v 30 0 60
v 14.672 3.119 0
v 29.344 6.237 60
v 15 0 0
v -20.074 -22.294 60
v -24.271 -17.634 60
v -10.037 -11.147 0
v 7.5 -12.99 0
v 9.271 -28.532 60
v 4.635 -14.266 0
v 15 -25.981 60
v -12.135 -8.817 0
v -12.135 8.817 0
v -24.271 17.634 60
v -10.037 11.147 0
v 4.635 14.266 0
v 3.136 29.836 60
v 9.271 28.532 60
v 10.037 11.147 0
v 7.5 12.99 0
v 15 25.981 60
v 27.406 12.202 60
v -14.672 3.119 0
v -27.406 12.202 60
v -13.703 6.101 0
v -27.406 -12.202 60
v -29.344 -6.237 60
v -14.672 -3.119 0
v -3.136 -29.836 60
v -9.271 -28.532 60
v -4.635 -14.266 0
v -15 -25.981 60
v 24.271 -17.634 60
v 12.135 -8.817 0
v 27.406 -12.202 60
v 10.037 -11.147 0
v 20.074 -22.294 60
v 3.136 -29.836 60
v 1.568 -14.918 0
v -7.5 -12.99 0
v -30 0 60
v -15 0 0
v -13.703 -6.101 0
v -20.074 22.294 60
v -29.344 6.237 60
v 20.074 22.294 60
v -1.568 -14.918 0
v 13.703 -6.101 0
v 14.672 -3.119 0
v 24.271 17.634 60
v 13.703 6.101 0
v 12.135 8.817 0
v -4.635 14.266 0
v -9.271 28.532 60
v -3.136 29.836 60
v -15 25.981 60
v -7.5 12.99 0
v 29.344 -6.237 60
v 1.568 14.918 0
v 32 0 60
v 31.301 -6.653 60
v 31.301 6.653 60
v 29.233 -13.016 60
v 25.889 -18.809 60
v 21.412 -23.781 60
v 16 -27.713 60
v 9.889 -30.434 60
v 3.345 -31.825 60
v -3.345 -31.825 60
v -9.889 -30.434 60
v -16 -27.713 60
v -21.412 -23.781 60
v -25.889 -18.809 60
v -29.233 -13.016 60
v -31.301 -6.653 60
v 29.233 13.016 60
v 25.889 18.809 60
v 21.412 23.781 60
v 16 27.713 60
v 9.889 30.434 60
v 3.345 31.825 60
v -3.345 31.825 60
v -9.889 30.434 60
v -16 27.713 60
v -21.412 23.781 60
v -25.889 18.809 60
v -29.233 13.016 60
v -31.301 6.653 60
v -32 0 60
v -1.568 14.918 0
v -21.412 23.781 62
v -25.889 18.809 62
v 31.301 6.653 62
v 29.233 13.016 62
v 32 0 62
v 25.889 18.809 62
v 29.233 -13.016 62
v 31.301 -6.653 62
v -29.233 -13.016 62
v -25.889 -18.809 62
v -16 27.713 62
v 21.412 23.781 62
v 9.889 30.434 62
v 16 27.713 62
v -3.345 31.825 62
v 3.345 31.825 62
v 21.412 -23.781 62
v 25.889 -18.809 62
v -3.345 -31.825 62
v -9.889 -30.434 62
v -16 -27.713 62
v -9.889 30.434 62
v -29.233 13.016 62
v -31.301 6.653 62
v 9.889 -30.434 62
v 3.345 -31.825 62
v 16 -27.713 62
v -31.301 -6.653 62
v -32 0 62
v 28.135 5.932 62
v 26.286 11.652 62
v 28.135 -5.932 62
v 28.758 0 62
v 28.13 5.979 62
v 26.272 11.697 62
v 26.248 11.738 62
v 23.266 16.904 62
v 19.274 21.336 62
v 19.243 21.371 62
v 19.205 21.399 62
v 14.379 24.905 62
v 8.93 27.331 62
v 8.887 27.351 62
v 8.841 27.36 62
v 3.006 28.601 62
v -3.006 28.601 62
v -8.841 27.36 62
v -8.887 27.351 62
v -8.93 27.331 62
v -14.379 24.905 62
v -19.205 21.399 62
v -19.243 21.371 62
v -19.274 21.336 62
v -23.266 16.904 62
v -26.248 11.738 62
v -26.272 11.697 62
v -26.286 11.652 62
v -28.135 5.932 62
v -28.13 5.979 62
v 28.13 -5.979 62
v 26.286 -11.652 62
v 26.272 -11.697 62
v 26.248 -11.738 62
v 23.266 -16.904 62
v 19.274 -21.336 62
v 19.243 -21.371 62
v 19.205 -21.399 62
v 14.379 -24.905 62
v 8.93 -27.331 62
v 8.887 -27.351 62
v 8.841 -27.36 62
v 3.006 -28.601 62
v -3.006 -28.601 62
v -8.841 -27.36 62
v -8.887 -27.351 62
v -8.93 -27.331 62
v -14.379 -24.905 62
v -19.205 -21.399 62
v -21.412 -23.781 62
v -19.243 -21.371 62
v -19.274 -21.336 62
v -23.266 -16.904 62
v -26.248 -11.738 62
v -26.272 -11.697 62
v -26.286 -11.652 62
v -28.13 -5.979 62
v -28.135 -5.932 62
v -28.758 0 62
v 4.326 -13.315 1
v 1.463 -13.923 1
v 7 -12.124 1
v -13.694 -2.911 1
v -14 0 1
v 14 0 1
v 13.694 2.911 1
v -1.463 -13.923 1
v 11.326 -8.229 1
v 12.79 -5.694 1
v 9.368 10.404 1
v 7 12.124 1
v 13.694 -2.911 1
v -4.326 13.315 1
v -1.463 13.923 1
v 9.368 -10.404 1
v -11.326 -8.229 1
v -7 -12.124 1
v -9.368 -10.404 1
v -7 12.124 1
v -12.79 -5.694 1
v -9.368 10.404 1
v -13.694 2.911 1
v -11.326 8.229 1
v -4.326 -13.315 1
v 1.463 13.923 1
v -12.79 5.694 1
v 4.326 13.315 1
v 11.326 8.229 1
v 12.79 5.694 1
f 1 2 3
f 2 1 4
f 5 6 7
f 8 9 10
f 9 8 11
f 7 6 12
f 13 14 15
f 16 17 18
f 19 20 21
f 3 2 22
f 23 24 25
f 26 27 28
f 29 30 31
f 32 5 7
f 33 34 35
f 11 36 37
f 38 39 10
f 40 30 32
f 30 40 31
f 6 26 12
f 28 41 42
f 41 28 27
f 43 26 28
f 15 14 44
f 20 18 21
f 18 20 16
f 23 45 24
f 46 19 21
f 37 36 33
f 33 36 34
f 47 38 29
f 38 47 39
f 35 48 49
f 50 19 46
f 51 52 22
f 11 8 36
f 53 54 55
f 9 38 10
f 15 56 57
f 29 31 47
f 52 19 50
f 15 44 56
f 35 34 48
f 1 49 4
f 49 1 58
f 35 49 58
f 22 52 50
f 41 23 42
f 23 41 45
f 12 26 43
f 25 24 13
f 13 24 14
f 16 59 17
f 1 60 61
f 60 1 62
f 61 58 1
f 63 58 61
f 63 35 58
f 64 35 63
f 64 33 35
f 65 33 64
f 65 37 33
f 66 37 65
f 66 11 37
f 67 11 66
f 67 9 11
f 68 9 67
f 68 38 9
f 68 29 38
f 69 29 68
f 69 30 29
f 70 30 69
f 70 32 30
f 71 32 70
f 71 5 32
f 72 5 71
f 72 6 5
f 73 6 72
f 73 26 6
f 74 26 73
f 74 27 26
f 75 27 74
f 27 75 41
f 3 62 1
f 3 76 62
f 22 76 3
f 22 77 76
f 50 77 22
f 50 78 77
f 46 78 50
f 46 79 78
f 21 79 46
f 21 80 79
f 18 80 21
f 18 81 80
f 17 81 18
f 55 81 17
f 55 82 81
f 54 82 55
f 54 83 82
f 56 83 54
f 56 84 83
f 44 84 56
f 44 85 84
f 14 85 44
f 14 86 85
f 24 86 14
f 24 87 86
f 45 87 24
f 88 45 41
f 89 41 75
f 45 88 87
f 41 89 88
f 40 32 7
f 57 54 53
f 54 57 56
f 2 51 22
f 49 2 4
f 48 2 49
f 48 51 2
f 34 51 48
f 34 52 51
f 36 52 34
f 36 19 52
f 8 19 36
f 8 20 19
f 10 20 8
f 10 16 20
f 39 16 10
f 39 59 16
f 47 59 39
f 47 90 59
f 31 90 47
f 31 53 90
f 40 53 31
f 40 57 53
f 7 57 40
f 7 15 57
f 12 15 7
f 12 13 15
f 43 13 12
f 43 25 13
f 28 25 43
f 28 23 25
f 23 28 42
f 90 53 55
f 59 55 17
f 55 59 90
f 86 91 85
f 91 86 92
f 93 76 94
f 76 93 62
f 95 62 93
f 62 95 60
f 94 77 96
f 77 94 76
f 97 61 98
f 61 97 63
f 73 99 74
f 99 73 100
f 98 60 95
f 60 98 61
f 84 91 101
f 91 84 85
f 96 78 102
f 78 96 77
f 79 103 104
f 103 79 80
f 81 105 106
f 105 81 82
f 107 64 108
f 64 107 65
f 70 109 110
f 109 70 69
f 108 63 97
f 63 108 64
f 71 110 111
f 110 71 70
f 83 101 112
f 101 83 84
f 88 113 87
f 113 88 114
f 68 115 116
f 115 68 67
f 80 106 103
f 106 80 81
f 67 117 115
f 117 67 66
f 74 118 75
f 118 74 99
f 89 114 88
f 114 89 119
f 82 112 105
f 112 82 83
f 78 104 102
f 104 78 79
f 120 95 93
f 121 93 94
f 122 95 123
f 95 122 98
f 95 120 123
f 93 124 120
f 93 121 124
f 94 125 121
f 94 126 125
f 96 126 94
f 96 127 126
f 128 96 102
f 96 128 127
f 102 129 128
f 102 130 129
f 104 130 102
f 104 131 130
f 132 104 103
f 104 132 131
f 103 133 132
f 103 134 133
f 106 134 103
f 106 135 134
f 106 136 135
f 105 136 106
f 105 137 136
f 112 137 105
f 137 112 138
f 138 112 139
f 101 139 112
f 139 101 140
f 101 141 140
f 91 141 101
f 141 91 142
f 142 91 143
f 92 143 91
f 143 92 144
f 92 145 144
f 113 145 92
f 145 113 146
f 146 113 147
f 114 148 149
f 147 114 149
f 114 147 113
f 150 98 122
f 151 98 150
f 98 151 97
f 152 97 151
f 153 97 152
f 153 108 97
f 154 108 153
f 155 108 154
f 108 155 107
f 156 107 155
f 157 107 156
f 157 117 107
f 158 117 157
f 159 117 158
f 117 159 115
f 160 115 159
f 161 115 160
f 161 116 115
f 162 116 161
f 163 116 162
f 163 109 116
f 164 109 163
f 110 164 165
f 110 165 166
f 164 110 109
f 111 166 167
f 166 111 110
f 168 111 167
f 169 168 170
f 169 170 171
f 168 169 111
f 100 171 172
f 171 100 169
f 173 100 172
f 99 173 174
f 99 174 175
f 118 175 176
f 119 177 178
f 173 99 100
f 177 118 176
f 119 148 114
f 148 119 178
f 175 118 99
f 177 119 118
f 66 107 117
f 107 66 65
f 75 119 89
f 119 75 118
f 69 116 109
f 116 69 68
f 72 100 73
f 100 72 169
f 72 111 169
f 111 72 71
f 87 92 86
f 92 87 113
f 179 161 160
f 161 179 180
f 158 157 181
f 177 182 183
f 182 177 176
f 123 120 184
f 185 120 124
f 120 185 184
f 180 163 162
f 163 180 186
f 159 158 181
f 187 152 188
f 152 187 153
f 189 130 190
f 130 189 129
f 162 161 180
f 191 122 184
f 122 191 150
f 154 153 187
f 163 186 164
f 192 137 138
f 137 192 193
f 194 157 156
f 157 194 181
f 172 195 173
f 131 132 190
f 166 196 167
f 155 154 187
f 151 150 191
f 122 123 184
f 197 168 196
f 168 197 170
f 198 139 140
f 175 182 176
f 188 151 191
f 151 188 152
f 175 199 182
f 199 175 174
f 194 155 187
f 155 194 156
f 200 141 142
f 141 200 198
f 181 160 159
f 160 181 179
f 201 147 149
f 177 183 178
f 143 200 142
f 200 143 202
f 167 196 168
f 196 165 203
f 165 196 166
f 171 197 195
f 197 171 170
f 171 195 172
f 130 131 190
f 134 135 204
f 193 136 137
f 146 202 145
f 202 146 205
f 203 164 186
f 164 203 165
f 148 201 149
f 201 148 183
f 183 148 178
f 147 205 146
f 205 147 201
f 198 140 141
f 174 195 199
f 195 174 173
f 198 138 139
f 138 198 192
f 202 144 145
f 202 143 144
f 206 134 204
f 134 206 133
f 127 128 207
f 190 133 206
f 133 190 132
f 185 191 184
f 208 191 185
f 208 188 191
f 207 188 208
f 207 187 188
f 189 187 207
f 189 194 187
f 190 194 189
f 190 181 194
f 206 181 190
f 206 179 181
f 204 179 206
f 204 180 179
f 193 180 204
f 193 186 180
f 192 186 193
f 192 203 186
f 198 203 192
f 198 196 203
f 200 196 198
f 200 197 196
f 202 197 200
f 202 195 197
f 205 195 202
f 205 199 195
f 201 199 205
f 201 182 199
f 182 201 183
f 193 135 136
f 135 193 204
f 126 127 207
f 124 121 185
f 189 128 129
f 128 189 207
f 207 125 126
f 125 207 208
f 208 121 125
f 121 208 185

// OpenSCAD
module pahar_plastic(inaltime_pahar,raza_baza_pahar,raza_sus_pahar,raza_buza,inaltime_buza,grosime_perete)
{
      difference(){
          union(){
        cylinder(h=inaltime_pahar, r1=raza_baza_pahar,r2=raza_sus_pahar);
        translate([0,0,inaltime_pahar])cylinder(h=inaltime_buza, r=raza_buza);
          }
        translate([0,0,grosime_perete])cylinder(h=inaltime_pahar+inaltime_buza, r1=raza_baza_pahar-grosime_perete,r2=raza_sus_pahar-grosime_perete);
        }
}
pahar_plastic(60,15,30,32,2,1);
